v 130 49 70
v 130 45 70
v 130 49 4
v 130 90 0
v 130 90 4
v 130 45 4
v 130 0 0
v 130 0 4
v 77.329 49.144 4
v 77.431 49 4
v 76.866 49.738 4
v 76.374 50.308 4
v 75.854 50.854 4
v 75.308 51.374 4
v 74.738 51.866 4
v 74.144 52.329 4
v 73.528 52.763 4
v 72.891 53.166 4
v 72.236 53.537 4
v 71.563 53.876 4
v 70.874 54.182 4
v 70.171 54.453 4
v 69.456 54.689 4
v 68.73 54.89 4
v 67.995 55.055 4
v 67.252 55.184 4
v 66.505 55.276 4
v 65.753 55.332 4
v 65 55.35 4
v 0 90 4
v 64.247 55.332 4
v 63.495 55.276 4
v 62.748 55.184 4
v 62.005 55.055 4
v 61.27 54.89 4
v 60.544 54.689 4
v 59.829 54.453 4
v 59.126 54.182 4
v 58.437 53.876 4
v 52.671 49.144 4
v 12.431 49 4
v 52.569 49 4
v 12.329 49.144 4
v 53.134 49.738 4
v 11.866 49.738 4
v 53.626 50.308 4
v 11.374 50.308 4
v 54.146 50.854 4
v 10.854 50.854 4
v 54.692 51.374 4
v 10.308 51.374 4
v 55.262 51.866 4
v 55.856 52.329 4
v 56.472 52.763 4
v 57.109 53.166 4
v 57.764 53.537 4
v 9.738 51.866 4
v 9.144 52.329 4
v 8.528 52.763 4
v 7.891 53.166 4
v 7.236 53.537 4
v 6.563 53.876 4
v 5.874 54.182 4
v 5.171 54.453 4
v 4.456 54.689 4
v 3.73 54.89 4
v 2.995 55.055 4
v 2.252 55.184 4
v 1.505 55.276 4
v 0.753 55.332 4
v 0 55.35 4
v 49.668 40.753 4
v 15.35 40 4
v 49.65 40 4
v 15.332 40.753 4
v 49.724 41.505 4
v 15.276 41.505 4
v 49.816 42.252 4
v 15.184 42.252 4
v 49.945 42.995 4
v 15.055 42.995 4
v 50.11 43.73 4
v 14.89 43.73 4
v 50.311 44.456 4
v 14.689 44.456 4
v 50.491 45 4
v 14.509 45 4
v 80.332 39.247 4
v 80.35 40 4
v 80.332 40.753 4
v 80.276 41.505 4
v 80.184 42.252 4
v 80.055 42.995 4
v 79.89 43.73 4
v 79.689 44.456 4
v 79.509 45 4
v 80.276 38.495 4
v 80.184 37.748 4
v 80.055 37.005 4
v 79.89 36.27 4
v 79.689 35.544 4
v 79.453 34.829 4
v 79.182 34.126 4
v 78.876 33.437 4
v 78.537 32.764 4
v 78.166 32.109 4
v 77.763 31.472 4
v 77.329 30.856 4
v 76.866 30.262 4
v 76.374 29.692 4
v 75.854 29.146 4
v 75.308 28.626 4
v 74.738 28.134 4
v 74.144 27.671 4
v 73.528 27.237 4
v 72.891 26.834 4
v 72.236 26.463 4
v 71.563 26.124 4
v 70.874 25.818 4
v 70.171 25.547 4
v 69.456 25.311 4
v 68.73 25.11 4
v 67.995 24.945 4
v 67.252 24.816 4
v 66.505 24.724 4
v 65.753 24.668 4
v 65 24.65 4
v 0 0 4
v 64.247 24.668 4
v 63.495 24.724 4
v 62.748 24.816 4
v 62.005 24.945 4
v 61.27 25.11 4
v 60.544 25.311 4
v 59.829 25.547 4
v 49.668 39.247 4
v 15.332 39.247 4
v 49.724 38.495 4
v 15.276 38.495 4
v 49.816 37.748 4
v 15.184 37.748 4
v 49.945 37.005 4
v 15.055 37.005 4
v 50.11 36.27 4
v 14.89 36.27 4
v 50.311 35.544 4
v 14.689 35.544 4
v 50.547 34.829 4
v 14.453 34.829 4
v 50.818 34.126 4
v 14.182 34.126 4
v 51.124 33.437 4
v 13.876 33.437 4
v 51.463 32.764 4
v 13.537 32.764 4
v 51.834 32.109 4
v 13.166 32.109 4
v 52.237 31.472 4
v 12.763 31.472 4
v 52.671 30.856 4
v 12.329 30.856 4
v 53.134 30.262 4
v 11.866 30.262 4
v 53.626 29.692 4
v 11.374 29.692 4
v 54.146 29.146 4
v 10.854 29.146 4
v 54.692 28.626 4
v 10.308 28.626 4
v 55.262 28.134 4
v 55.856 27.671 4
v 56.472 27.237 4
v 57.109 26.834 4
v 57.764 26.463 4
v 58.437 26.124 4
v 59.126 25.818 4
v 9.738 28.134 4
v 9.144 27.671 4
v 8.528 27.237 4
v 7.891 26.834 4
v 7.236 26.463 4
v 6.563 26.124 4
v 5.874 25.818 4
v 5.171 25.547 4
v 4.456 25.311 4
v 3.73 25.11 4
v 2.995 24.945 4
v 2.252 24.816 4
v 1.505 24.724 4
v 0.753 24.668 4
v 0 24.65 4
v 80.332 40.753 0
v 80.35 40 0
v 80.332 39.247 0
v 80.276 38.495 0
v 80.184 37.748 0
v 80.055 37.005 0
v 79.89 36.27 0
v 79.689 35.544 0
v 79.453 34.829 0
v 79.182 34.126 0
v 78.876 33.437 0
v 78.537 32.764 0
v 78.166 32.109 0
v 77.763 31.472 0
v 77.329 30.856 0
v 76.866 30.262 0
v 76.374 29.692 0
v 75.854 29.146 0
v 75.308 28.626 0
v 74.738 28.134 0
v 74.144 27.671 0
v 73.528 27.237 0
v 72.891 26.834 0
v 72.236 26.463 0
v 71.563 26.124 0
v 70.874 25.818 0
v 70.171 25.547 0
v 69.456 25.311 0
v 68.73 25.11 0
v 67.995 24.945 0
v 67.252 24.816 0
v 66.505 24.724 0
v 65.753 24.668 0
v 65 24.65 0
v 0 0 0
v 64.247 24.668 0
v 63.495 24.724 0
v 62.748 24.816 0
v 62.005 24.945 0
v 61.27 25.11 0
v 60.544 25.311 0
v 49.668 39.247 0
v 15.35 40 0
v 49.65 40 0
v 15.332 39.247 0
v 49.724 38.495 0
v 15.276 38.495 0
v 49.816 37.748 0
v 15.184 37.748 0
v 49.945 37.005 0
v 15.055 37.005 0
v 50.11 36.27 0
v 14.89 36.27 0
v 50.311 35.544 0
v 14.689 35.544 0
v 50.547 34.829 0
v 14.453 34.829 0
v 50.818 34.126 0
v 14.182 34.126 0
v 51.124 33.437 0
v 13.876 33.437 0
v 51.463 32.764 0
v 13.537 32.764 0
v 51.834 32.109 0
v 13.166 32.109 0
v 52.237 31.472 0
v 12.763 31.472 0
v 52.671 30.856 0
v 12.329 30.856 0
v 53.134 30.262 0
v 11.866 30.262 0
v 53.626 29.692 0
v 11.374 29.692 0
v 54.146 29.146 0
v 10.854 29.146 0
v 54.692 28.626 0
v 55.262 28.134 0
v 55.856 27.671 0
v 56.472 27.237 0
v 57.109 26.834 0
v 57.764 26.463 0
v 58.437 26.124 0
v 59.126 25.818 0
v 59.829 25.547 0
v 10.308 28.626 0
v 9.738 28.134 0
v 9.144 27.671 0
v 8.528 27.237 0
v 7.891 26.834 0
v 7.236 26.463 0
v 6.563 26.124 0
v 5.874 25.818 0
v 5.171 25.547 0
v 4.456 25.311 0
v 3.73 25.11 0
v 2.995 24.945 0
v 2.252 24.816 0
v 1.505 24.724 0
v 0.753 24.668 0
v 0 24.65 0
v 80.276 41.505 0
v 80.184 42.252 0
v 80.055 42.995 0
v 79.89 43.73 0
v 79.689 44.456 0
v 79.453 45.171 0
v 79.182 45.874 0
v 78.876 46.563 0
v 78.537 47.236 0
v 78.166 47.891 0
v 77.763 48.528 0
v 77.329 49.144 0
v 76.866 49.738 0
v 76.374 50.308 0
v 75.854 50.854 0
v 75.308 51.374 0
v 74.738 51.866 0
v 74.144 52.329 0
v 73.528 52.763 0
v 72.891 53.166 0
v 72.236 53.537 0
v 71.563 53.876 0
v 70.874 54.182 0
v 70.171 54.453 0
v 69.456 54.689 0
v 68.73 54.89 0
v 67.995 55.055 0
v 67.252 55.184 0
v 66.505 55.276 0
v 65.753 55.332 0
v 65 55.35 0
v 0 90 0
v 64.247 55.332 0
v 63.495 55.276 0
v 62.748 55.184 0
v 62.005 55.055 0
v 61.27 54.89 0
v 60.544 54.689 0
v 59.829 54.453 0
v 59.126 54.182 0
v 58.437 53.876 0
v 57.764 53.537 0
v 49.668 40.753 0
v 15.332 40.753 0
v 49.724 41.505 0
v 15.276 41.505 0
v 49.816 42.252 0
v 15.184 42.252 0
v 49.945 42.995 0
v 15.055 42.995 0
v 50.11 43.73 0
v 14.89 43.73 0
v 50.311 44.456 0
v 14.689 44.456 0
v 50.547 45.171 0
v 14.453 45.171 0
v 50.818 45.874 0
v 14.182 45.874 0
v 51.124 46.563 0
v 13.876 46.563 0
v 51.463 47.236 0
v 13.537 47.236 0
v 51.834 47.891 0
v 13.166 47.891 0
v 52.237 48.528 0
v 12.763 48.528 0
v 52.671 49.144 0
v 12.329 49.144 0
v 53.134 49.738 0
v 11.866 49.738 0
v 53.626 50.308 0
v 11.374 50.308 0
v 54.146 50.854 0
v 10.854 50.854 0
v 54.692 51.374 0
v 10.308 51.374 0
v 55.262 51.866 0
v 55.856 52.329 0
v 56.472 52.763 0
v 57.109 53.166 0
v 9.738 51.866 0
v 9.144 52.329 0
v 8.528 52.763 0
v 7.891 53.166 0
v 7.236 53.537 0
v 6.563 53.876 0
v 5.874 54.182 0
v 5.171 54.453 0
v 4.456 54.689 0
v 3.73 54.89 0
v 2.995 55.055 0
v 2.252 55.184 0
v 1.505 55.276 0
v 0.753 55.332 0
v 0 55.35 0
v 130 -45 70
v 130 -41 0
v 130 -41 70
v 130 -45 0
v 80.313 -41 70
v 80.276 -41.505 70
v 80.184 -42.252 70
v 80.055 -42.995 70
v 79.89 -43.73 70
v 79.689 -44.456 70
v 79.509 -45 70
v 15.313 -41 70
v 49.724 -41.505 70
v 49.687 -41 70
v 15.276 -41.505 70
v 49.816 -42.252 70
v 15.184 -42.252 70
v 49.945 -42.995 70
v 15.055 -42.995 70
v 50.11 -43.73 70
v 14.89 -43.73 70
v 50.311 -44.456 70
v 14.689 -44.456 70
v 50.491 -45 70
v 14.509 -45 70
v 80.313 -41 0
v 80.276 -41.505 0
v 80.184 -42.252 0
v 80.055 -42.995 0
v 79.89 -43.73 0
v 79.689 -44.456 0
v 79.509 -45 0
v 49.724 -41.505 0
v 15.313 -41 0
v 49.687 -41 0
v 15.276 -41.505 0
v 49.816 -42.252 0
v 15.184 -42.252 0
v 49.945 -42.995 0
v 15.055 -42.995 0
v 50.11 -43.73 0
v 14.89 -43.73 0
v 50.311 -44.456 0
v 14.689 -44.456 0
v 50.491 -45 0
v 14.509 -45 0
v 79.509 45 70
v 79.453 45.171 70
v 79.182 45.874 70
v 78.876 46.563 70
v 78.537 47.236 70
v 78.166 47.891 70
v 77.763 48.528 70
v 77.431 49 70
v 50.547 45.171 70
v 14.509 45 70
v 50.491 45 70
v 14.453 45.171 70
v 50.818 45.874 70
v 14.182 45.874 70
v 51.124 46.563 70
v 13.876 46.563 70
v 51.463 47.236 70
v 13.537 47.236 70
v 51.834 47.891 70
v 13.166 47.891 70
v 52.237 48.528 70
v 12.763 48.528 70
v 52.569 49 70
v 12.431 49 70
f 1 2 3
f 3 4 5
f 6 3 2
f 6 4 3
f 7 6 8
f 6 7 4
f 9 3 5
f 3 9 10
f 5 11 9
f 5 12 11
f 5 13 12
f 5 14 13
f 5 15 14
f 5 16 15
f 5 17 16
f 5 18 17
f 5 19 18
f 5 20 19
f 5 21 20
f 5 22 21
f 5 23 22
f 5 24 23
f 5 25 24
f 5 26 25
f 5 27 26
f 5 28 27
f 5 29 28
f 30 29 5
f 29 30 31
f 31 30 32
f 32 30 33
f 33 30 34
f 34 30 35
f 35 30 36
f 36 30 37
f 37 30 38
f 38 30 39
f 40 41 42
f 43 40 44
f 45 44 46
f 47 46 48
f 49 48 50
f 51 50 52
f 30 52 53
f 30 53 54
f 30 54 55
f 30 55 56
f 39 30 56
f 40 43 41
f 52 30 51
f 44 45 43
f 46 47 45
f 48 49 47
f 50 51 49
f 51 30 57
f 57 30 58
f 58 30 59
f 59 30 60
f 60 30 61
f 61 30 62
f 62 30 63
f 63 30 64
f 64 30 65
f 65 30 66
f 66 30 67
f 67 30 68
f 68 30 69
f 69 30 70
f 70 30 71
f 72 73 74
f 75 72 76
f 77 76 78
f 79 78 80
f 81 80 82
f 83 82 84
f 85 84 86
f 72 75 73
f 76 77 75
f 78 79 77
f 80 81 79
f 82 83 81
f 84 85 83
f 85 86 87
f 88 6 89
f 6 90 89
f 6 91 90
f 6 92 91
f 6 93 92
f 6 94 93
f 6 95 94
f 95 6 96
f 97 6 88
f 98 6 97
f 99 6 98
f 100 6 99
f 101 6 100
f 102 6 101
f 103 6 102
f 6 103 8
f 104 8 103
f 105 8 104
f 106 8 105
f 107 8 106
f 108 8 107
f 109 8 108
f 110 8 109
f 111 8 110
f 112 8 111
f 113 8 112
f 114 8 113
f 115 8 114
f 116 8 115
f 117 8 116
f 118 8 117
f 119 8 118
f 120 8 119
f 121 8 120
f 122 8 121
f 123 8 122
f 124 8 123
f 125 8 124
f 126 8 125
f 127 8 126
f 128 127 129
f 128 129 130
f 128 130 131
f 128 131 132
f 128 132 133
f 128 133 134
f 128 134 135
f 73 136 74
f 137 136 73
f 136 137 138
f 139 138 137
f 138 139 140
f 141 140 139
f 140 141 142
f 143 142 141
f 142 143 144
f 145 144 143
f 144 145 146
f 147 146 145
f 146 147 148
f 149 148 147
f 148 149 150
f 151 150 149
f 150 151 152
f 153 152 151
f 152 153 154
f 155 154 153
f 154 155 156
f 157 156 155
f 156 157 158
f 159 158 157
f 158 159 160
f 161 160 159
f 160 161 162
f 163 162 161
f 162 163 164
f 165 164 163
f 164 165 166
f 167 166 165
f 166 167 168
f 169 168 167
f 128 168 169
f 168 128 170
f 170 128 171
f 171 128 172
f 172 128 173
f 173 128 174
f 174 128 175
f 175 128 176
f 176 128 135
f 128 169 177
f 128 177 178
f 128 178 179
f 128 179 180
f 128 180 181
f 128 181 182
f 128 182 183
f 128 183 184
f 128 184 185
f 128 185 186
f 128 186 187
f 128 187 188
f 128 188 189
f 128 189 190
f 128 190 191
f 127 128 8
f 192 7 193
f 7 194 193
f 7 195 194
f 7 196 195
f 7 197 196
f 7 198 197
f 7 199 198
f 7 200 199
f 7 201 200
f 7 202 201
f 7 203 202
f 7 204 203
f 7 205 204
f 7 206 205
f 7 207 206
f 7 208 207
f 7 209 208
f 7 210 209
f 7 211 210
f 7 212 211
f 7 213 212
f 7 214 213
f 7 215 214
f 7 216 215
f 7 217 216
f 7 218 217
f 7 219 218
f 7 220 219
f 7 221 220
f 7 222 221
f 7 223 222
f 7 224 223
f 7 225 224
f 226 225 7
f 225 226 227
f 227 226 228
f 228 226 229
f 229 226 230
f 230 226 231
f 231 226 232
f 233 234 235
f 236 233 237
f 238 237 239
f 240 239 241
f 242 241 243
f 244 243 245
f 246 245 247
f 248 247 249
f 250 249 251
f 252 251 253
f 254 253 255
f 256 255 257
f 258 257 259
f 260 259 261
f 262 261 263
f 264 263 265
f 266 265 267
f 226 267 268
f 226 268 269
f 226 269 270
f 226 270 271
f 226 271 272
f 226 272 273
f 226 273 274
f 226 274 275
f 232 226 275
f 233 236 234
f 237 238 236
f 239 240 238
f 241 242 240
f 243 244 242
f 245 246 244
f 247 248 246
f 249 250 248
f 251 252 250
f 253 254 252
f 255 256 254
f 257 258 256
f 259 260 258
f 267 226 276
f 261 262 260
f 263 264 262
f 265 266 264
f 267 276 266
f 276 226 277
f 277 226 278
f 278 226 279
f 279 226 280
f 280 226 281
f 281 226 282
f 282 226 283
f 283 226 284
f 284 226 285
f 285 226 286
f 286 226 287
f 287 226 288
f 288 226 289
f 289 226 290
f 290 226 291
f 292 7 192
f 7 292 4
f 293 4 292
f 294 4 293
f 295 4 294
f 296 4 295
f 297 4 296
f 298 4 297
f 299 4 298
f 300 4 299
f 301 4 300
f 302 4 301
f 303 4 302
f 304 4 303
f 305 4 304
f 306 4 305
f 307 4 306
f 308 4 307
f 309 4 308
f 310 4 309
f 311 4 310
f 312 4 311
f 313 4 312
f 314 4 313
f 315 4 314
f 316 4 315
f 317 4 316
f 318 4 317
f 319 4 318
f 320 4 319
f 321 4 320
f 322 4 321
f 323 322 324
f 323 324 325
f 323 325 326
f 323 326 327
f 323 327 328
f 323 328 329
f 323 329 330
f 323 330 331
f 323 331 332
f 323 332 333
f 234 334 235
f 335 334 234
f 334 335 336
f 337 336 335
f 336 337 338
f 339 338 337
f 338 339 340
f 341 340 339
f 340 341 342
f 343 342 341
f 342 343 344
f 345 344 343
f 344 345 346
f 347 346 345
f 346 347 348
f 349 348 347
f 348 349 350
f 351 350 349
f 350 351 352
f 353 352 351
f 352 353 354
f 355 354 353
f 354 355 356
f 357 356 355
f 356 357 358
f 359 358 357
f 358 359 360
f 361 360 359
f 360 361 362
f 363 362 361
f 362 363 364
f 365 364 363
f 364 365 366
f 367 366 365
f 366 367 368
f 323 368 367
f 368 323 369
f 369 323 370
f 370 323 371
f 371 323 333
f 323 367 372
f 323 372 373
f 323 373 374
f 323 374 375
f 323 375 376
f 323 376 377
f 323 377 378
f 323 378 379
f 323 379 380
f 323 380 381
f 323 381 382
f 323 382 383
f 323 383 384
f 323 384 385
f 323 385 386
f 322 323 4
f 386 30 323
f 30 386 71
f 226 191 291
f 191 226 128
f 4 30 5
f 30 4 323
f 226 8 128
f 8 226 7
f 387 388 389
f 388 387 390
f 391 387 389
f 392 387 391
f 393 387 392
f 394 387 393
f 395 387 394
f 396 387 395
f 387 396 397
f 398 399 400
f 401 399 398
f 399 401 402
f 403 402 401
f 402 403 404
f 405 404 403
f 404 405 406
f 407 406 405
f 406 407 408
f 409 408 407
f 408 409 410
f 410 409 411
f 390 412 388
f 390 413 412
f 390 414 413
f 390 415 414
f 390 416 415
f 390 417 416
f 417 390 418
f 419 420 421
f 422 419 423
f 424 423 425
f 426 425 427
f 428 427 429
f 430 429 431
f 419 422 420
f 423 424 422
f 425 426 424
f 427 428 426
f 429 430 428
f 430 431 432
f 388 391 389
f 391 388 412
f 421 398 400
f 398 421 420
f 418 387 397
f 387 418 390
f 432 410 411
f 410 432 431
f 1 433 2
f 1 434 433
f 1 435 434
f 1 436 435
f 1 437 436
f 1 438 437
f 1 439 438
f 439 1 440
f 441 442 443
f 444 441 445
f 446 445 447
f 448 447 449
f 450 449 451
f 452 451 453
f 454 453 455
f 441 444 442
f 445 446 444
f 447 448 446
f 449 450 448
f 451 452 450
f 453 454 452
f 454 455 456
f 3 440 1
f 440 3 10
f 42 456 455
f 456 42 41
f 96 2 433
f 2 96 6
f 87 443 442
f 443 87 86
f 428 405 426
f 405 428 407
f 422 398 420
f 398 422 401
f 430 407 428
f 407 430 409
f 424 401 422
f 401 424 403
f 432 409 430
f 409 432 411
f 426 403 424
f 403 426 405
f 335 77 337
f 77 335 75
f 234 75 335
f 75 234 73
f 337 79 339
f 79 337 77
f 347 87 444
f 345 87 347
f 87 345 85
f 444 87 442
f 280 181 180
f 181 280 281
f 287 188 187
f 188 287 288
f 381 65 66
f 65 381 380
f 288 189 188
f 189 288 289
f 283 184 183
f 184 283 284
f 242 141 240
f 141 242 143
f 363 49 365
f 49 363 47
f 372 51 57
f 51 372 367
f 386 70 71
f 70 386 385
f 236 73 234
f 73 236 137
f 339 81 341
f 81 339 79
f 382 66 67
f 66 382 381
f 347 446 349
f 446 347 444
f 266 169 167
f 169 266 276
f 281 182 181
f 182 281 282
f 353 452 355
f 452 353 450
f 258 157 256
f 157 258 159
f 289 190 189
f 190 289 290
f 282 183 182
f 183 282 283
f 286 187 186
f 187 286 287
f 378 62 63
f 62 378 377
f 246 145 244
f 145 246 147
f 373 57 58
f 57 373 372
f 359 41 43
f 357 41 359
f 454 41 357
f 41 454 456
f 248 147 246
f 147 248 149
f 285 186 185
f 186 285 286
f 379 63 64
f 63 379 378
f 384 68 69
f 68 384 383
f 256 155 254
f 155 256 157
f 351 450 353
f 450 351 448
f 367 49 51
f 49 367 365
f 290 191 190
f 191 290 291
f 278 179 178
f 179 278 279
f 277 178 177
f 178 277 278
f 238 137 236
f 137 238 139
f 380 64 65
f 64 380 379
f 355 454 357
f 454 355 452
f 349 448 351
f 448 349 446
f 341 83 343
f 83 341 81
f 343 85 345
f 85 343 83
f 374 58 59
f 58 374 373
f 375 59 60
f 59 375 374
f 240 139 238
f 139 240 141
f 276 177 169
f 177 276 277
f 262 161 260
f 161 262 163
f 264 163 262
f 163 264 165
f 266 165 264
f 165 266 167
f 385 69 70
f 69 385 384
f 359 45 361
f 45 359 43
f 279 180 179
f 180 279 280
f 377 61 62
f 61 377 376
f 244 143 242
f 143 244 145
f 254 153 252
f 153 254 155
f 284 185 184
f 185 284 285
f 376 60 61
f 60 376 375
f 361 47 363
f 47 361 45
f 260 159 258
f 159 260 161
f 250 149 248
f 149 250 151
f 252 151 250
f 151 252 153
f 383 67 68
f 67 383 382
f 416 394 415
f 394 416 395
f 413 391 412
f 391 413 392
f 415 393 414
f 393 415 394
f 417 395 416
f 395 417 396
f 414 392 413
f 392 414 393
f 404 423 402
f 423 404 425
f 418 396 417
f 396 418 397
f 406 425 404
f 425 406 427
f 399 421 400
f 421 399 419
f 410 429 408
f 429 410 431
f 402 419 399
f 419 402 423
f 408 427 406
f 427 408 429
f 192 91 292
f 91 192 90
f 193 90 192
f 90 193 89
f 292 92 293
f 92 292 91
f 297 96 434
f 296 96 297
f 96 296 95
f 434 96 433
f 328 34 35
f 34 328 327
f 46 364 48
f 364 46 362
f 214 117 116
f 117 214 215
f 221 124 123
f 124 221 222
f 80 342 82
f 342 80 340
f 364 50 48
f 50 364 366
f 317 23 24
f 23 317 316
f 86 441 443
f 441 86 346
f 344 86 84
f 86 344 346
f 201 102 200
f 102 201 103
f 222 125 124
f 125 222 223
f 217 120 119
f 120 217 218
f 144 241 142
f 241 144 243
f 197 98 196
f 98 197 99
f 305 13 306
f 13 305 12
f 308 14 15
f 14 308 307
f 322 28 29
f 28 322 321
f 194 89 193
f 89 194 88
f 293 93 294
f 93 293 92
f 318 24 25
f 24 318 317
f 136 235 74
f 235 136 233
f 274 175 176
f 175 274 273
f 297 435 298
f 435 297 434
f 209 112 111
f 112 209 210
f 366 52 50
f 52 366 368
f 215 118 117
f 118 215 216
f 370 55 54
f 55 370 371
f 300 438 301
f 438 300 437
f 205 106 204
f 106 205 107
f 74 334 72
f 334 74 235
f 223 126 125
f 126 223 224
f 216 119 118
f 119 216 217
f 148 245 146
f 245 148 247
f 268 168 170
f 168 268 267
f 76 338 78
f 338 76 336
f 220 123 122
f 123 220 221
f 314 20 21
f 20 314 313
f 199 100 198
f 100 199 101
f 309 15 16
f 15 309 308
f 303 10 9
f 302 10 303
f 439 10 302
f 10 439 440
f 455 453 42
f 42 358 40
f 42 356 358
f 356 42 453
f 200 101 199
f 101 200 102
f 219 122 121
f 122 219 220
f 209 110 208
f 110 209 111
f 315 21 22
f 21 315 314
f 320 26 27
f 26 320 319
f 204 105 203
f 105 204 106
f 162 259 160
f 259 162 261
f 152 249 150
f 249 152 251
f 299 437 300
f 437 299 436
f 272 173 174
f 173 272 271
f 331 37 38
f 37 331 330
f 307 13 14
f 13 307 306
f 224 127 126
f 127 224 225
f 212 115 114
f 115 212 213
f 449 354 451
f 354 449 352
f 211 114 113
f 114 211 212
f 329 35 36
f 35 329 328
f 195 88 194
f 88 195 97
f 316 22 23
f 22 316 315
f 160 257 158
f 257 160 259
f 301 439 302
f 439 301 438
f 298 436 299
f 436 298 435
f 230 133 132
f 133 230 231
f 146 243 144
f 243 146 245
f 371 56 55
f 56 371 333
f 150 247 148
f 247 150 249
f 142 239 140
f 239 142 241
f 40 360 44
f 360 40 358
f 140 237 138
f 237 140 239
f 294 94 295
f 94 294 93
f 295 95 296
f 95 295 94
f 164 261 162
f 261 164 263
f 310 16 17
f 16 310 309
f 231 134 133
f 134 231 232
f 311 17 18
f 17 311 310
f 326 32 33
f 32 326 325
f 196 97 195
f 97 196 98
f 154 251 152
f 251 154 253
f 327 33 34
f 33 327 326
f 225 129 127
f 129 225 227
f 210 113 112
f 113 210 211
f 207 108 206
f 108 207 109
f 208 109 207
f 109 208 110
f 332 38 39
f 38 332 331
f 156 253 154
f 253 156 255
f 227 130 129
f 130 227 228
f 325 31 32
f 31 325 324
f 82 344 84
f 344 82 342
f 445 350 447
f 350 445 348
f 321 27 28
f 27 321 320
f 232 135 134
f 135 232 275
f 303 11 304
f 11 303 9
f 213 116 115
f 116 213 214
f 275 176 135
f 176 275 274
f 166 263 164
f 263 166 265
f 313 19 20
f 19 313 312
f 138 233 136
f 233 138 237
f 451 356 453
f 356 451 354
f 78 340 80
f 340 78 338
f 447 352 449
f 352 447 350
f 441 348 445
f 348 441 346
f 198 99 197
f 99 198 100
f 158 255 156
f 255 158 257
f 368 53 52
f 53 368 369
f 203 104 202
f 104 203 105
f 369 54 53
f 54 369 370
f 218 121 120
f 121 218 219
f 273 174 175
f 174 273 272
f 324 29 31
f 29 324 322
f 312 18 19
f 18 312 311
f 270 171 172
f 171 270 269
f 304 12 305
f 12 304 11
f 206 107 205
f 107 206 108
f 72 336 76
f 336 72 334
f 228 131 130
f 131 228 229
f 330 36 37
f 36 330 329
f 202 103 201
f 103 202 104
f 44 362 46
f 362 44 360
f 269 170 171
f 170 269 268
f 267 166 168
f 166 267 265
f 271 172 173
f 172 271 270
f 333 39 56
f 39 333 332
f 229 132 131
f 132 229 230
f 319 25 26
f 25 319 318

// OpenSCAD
// Rack for six 50 mL conical (Falcon-type) tubes
// Print orientation: Upside down. Flat plate on bed (Z=0).
// After printing, flip over so walls stand on the bed and tubes insert from top.

// --- Dimensions ---
// Plate size
$plate_x = 130; // mm
$plate_y = 90;  // mm
$plate_z = 4;   // mm

// Hole specifications
$hole_diameter = 30.5; // mm
$hole_count_x = 3;     // 3 holes along X
$hole_count_y = 2;     // 2 holes along Y (rows)
$hole_spacing_x = 40;  // mm centre-to-centre
$hole_spacing_y = 40;  // mm centre-to-centre

// Wall specifications
$wall_length = 130;    // mm (along X)
$wall_thickness = 4;   // mm (along Y)
$wall_height = 70;     // mm (rise from plate)

// --- Derived Variables ---
// Calculate hole positions relative to plate center (0,0)
// X positions: -65, 0, 65 (since spacing is 40 and centered)
// Y positions: -40, 40 (since spacing is 40 and centered)
$hole_x_positions = [-65, 0, 65];
$hole_y_positions = [-40, 40];

// --- Configuration ---
$fn = 128; // High resolution for round holes

// --- Main Block ---
difference() {
    // 1. Create the base plate
    union() {
        // The plate itself (Centered on origin)
        translate([0, 0, 0]) 
            cube([$plate_x, $plate_y, $plate_z], center = false);
        
        // The two side walls
        // Wall 1: Left side (at Y = -$plate_y/2)
        // Note: The wall is placed at the very edge of the plate.
        translate([0, -$plate_y/2, 0]) 
            cube([$wall_length, $wall_thickness, $wall_height], center = false);
        
        // Wall 2: Right side (at Y = +$plate_y/2)
        translate([0, $plate_y/2, 0]) 
            cube([$wall_length, $wall_thickness, $wall_height], center = false);
    }
    
    // 2. Cut the holes
    // We iterate through the grid of holes
    for (xi = [0:$hole_count_x-1]) {
        for (yi = [0:$hole_count_y-1]) {
            // Calculate current hole center
            x_pos = $hole_x_positions[xi];
            y_pos = $hole_y_positions[yi];
            
            // Create a cylinder slightly larger than the hole to ensure clean cut
            // Extending 0.1mm past the face ensures no coplanar faces
            $cut_radius = ($hole_diameter / 2) + 0.1;
            
            translate([x_pos, y_pos, 0])
                cylinder(h = $wall_height + $plate_z + 1, r = $cut_radius, $fn = $fn);
        }
    }
}
